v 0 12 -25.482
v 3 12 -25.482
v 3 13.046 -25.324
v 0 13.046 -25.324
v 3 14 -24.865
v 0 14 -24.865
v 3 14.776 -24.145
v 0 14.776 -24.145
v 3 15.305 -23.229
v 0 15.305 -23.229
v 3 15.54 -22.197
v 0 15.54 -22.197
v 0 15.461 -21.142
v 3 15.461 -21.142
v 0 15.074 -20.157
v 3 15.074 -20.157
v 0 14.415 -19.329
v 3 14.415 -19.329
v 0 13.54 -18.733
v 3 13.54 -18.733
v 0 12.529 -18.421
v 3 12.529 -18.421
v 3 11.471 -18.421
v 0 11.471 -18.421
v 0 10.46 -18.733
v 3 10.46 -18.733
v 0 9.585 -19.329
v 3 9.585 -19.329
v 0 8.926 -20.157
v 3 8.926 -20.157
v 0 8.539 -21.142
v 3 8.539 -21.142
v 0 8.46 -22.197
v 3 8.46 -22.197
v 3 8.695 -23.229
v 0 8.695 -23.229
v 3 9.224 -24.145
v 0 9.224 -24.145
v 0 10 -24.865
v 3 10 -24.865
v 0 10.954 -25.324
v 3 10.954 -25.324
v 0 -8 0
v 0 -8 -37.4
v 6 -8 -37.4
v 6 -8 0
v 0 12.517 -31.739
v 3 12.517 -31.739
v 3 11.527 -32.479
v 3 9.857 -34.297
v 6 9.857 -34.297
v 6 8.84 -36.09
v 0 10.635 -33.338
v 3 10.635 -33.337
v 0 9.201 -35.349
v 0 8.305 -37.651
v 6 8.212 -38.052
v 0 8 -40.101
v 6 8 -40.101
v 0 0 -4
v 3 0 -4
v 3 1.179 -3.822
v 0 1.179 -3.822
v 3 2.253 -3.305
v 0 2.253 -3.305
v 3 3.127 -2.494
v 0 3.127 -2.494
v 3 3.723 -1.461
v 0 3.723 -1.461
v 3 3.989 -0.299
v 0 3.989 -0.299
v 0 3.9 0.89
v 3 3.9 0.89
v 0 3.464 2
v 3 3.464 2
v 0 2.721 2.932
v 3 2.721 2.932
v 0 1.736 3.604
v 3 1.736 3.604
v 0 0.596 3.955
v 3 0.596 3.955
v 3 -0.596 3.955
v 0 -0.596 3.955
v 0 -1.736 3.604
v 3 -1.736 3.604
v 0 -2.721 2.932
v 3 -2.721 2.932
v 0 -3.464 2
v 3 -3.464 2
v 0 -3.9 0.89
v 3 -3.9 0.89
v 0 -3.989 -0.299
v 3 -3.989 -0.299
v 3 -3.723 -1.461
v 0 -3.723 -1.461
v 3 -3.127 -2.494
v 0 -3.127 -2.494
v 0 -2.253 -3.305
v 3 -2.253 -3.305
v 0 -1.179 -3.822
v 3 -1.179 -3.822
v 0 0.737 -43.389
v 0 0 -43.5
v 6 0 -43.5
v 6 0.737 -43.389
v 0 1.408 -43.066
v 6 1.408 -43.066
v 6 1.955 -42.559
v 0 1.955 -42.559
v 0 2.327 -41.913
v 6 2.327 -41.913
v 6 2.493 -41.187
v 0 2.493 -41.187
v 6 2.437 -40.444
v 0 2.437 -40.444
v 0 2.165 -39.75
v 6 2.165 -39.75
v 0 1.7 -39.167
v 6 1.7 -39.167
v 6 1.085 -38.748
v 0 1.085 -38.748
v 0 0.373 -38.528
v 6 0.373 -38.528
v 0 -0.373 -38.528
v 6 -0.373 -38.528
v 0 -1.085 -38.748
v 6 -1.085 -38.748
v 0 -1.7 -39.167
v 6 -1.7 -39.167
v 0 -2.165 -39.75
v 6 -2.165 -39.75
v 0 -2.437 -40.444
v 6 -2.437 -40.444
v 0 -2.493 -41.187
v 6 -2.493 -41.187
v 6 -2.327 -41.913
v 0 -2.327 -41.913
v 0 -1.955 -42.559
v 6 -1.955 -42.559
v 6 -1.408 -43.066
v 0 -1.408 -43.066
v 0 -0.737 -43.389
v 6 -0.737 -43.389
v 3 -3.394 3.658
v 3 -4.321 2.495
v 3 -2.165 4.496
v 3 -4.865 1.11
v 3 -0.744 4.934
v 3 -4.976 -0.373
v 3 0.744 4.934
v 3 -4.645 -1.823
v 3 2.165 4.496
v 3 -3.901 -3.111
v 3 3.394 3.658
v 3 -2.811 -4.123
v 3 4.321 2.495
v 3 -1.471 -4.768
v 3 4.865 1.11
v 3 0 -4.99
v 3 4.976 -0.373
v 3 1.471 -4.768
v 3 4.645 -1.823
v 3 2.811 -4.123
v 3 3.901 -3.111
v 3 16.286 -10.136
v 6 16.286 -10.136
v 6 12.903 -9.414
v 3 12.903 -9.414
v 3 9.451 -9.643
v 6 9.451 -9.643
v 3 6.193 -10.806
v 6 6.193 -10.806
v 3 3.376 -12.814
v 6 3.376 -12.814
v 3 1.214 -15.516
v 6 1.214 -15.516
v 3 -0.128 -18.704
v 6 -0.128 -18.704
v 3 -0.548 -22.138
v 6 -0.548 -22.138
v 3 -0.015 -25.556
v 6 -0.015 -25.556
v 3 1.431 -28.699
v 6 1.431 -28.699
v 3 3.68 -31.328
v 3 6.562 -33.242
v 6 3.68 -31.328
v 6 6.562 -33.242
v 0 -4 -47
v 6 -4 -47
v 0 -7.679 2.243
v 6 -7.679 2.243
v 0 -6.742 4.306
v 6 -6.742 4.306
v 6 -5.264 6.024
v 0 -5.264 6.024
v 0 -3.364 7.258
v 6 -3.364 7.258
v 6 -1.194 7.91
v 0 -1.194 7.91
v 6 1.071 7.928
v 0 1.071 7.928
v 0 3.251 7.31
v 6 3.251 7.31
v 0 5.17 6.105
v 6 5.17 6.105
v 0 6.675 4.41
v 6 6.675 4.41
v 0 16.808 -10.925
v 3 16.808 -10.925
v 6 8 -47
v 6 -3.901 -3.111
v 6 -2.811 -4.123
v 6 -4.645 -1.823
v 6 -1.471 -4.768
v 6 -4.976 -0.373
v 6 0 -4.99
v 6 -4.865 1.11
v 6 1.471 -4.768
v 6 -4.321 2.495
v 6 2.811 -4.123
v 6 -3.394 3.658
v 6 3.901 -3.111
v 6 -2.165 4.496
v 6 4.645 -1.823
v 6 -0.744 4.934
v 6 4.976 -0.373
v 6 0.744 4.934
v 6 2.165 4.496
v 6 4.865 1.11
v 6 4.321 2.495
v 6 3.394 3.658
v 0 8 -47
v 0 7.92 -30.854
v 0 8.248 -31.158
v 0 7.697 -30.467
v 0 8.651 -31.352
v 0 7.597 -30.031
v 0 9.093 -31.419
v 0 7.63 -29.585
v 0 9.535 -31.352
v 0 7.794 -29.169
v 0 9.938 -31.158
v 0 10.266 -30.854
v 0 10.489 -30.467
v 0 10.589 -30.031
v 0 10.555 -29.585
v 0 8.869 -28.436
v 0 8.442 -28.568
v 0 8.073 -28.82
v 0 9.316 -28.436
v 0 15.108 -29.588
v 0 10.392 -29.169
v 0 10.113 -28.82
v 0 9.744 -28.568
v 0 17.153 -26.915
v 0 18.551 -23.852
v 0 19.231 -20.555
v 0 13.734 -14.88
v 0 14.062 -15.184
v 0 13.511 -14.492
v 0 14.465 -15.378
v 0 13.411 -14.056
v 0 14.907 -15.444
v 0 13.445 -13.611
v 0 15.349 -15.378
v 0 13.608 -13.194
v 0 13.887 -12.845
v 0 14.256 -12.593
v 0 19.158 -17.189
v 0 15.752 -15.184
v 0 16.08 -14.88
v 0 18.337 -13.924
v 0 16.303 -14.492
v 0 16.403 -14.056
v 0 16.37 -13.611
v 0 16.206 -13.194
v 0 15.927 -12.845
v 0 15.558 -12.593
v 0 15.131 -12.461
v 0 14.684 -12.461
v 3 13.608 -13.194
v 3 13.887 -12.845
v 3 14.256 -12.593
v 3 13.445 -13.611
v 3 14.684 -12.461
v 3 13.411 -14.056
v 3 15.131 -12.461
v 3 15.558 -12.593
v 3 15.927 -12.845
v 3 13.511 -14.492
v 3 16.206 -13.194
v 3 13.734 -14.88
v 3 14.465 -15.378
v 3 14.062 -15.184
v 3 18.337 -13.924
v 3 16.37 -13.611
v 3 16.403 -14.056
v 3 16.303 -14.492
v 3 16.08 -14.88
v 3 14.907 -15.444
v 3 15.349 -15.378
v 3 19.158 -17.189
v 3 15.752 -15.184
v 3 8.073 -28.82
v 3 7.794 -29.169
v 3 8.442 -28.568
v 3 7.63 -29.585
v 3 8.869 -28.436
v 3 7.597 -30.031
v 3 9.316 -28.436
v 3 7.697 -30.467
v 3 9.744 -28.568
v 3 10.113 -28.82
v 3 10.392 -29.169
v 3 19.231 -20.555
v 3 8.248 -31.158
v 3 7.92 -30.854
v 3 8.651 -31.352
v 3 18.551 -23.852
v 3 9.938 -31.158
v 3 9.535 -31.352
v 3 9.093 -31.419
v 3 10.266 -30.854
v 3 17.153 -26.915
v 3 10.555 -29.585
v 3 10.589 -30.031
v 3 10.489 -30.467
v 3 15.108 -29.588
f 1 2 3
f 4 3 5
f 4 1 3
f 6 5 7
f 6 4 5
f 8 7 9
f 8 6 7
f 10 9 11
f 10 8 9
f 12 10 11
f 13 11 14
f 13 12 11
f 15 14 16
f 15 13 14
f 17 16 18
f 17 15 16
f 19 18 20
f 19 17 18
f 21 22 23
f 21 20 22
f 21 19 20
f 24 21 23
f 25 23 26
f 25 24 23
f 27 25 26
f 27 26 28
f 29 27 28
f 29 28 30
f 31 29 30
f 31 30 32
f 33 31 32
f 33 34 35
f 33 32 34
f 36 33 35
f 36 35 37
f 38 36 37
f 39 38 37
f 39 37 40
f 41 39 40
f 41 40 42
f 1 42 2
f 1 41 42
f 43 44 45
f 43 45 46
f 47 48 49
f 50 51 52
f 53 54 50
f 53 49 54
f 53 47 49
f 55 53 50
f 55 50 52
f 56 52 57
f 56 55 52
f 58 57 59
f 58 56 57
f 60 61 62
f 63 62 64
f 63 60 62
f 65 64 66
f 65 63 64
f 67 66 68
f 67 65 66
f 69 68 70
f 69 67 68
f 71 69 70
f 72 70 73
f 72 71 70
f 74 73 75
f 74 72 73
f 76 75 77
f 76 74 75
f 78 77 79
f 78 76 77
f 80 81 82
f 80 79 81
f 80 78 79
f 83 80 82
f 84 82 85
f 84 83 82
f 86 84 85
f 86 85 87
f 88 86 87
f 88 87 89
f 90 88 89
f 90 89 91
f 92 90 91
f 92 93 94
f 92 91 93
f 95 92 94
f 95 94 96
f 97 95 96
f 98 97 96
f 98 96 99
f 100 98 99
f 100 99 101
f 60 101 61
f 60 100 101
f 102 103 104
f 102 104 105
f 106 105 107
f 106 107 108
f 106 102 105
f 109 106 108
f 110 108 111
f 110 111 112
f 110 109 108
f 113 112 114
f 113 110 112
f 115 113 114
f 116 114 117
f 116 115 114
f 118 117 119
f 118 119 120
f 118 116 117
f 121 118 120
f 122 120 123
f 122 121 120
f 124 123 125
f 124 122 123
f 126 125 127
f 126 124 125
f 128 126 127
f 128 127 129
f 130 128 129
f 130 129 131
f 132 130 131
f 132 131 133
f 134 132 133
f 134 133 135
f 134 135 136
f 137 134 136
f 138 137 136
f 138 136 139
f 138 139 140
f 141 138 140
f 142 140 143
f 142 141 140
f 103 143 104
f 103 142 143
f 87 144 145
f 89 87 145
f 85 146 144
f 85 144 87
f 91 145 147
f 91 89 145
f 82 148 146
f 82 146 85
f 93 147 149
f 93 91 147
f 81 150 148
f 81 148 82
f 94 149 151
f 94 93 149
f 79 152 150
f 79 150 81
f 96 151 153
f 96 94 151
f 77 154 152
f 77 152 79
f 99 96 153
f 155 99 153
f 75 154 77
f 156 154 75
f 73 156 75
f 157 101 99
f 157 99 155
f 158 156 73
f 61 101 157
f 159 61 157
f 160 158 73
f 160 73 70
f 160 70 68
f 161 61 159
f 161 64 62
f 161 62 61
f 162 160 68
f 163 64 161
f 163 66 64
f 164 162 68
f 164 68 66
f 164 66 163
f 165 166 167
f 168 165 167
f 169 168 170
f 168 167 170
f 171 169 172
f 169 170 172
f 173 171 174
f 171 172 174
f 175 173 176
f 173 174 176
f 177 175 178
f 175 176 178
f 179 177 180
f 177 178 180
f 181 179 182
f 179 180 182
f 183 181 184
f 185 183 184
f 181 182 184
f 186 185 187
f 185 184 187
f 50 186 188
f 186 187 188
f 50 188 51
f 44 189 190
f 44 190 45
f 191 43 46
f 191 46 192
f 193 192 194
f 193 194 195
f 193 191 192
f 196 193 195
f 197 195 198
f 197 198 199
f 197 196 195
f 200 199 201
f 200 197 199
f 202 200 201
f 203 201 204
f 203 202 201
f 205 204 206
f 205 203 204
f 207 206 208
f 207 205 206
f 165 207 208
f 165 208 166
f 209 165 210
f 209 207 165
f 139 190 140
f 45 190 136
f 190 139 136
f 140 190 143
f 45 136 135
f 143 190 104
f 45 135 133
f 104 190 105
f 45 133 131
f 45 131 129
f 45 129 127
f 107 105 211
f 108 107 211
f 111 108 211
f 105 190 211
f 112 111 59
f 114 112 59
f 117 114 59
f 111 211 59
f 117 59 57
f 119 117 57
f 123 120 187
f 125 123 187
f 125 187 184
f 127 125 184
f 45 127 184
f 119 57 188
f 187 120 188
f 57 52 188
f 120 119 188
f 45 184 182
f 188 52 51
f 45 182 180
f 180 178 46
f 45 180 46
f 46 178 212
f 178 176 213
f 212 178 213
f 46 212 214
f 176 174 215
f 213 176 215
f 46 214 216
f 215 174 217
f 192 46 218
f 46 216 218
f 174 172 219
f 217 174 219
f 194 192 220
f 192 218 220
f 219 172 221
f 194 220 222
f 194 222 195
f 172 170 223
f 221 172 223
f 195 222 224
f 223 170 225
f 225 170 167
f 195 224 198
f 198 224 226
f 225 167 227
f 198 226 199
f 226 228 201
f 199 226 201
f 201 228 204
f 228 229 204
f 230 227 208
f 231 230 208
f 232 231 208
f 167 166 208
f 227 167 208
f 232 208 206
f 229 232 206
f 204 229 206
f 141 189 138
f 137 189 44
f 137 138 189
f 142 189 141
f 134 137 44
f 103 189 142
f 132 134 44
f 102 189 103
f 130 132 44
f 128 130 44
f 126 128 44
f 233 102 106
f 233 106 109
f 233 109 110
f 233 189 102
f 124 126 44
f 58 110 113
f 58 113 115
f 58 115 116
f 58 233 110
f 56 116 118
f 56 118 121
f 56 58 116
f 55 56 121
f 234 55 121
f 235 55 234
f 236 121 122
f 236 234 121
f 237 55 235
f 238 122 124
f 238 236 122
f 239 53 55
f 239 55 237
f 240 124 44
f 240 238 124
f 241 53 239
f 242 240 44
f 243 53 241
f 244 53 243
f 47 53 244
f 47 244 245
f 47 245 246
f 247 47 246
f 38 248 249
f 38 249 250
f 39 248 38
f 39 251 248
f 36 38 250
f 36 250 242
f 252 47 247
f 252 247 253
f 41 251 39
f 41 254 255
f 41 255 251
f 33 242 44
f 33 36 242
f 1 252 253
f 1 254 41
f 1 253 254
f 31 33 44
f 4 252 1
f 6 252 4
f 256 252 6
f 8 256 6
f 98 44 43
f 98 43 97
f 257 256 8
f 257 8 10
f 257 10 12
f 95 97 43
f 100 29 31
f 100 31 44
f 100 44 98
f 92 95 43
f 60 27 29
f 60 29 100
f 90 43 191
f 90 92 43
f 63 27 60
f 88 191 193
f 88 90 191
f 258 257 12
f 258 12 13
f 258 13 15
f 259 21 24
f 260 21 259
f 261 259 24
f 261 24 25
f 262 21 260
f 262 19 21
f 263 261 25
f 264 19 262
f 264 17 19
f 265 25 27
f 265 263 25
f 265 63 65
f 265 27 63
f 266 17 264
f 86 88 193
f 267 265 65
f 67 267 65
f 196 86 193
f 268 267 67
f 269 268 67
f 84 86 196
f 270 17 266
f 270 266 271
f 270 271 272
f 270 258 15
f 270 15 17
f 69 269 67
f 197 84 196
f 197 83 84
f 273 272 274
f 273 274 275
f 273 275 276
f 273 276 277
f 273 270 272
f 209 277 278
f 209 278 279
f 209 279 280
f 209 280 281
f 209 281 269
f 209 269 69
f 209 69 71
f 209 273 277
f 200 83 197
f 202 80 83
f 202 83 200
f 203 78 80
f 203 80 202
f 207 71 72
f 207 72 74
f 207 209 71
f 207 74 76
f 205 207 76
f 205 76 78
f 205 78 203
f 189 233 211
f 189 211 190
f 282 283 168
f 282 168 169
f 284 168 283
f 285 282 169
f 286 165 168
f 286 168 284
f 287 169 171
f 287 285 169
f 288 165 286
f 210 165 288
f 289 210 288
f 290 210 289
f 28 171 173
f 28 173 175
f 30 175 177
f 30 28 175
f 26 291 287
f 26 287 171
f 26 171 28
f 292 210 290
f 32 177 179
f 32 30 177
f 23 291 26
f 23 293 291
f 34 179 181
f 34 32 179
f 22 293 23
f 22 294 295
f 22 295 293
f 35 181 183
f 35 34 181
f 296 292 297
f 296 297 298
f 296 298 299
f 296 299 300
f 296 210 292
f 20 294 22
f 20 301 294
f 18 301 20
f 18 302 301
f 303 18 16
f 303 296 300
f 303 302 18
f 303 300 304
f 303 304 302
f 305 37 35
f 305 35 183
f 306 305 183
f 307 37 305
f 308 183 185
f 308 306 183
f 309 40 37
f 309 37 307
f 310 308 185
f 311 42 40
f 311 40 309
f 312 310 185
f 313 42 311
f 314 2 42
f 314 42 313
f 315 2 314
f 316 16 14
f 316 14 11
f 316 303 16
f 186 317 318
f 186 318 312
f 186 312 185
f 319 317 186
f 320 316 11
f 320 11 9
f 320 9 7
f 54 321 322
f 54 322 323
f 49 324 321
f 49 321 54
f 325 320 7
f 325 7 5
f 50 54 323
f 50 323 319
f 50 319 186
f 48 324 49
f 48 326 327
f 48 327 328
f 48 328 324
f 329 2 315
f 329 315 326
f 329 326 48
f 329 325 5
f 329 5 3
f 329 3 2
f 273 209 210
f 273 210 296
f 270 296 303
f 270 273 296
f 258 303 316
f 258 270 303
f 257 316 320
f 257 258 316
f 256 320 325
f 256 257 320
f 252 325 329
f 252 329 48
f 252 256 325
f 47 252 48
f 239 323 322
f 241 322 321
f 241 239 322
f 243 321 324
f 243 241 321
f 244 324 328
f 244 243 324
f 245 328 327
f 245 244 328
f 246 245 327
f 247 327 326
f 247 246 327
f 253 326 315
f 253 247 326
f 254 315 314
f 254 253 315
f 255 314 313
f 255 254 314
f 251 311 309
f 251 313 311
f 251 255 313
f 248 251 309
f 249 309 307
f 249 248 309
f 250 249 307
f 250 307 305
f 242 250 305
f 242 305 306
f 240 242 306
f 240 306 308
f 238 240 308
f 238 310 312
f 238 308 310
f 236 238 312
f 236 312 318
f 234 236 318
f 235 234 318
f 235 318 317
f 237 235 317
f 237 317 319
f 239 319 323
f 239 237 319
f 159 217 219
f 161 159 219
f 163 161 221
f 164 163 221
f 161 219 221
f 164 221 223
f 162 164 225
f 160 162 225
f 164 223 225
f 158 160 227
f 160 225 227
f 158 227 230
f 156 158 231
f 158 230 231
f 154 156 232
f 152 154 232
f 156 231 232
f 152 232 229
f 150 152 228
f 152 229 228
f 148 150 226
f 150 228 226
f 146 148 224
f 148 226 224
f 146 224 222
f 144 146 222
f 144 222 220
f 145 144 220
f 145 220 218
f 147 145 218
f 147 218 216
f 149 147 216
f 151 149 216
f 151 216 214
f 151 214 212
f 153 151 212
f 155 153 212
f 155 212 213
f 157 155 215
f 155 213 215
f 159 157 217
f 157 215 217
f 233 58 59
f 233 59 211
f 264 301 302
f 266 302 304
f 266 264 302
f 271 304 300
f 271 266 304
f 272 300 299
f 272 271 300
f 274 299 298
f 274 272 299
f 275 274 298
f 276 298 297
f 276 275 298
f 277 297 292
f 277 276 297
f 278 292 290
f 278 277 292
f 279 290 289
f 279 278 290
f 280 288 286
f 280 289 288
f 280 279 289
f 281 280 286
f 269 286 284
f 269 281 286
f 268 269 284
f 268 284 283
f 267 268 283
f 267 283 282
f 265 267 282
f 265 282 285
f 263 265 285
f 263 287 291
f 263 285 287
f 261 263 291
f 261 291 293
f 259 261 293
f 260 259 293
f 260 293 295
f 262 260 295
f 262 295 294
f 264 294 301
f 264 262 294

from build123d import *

# Parameters (mm, degrees)
SKETCH1_R           = 3.55
SKETCH1_R_2         = 4
SKETCH1_R_3         = 2.5
SKETCH1_R_4         = 1.5
BOSS_EXTRUDE1_DEPTH = 6
SKETCH2_R           = 4.99
CUT_EXTRUDE1_DEPTH  = 3
SKETCH3_R           = 12.55
CUT_EXTRUDE2_DEPTH  = 3


with BuildPart() as part:
    # Sketch1 → Boss-Extrude1 (new body)
    with BuildSketch(Plane(origin=(0, 0, 0), x_dir=(0, 0, -1), z_dir=(1, 0, 0))):
        with BuildLine():
            Line((-4.410283071, 6.674533934), (10.924994259, 16.807513206))
            ThreePointArc((10.924994259, 16.807513206), (22.222626062, 18.983884909), (31.738603868, 12.517104832))
            ThreePointArc((31.738603868, 12.517104832), (35.34906679, 9.201450356), (40.101489768, 8))
            Line((40.101489768, 8), (47, 8))
            Line((47, 8), (47, -4))
            Line((47, -4), (37.4, -8))
            Line((37.4, -8), (0, -8))
            ThreePointArc((0, -8), (-7.66147086, -2.302577744), (-4.410283071, 6.674533934))
        make_face()
        with Locations((21.931712199, 12)):
            Circle(SKETCH1_R, mode=Mode.SUBTRACT)
        Circle(SKETCH1_R_2, mode=Mode.SUBTRACT)
        with Locations((41, 0)):
            Circle(SKETCH1_R_3, mode=Mode.SUBTRACT)
        with Locations((29.919099476, 9.092828782)):
            Circle(SKETCH1_R_4, mode=Mode.SUBTRACT)
        with Locations((13.944324923, 14.907171218)):
            Circle(SKETCH1_R_4, mode=Mode.SUBTRACT)
    extrude(amount=BOSS_EXTRUDE1_DEPTH)

    # Sketch2 → Cut-Extrude1 (cut)
    with BuildSketch(Plane(origin=(6, 0, 0), x_dir=(0, 0, -1), z_dir=(1, 0, 0))):
        Circle(SKETCH2_R)
    extrude(amount=-CUT_EXTRUDE1_DEPTH, mode=Mode.SUBTRACT)

    # Sketch3 → Cut-Extrude2 (cut)
    with BuildSketch(Plane(origin=(6, 0, 0), x_dir=(0, 0, -1), z_dir=(1, 0, 0))):
        with Locations((21.931712199, 12)):
            Circle(SKETCH3_R)
    extrude(amount=-CUT_EXTRUDE2_DEPTH, mode=Mode.SUBTRACT)


solid = part.part
